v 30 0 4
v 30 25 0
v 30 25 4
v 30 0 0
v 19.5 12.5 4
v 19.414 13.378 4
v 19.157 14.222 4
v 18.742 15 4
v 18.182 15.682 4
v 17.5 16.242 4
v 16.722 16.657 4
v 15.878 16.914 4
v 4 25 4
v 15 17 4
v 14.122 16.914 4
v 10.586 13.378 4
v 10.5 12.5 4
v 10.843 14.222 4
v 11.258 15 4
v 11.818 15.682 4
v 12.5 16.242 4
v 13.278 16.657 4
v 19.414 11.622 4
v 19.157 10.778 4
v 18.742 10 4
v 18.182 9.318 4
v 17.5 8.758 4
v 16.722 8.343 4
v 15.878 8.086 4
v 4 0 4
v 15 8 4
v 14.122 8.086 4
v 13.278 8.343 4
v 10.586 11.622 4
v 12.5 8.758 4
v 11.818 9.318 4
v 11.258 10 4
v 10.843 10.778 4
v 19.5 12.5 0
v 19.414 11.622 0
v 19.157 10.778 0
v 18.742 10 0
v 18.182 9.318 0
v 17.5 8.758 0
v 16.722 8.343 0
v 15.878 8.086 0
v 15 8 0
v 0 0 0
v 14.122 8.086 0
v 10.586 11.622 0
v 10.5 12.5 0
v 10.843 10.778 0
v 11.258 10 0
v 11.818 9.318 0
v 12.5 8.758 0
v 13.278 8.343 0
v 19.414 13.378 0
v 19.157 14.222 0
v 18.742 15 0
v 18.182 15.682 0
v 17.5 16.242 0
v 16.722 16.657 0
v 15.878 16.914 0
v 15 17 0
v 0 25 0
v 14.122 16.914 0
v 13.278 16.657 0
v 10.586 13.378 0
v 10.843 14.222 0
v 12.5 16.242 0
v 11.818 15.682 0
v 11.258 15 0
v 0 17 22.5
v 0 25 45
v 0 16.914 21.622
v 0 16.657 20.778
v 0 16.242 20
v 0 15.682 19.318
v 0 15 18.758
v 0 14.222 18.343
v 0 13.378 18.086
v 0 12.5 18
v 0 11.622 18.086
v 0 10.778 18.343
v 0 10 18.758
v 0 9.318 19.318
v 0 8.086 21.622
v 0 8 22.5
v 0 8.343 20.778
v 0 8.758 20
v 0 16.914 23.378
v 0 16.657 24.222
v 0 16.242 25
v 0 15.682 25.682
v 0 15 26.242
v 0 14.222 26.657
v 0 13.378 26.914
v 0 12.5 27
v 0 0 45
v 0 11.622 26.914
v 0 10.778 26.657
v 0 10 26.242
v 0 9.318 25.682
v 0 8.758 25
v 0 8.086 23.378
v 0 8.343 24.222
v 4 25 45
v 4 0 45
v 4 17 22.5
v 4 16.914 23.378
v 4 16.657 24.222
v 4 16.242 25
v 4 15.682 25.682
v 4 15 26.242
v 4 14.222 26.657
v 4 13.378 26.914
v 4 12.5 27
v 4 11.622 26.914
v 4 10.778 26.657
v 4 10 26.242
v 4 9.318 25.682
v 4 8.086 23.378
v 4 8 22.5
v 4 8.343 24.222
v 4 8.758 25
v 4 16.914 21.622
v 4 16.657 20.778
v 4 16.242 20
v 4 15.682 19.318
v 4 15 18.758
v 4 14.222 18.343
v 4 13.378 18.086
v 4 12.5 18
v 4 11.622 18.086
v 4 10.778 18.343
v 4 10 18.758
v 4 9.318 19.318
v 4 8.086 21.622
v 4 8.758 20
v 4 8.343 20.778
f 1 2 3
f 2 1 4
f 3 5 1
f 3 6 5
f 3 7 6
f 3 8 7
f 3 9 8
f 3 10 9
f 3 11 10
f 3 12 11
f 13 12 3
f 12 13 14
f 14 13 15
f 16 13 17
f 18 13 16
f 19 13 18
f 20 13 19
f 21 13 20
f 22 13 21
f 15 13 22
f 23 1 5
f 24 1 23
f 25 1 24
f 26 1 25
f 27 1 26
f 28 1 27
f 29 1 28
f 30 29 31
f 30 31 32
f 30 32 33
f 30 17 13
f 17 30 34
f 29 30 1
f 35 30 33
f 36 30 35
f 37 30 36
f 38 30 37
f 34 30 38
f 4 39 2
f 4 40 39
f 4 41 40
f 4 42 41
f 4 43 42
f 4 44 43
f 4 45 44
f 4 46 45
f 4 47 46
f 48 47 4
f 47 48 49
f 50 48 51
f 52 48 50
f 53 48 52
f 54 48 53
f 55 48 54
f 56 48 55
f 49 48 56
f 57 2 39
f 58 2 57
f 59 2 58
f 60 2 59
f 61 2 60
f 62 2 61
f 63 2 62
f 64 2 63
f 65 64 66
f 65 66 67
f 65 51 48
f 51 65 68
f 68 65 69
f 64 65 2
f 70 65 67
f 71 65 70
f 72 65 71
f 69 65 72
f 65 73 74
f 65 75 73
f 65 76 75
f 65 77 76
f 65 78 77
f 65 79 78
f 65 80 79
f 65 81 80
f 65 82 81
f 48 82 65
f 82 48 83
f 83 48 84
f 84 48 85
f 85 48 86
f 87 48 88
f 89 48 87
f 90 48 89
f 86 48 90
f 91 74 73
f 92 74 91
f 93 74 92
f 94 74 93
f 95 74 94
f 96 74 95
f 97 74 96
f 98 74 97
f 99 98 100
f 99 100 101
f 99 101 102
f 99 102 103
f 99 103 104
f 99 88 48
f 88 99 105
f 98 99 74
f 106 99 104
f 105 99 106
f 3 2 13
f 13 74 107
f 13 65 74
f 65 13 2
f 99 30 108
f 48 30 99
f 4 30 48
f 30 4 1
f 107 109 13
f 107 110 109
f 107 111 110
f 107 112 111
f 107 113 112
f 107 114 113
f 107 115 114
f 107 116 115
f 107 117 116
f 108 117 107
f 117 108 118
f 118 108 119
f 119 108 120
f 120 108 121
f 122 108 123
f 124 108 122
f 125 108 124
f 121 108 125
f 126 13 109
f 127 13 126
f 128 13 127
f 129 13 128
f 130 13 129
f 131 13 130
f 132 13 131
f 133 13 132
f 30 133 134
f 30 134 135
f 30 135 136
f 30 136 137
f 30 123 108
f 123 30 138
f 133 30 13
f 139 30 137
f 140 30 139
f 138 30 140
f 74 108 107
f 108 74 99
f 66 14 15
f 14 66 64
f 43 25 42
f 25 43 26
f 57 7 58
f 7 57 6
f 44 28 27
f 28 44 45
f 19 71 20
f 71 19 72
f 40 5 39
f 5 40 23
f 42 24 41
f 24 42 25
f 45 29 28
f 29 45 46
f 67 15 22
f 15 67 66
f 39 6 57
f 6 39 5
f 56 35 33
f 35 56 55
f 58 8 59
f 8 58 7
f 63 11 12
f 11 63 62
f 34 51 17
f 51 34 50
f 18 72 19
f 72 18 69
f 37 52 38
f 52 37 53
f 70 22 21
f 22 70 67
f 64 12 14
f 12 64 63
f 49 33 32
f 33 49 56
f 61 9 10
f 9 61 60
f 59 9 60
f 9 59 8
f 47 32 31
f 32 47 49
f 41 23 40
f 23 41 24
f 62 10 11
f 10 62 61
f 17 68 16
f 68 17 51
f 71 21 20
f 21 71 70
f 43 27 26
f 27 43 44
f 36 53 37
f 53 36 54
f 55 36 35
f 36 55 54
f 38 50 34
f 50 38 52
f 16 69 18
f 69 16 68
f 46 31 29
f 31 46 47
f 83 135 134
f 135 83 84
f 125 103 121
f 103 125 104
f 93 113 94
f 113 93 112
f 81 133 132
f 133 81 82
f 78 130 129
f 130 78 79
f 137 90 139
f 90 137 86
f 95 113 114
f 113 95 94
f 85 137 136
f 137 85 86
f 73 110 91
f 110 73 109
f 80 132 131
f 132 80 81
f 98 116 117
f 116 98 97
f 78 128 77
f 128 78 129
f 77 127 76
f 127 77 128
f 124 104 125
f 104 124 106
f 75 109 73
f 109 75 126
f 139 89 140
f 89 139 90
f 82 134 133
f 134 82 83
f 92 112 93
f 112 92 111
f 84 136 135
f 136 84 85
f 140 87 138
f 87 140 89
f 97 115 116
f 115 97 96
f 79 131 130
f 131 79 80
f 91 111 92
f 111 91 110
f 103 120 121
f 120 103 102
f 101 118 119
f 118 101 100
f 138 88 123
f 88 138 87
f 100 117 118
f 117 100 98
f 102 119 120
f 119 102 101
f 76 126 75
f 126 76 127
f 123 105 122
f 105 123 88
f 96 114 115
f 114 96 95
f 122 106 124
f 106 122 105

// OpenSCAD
$fn = 32;
// ----------------------------------------------------------------------
// L-bracket: 30 x 25 x 45 mm
// ----------------------------------------------------------------------

// --- parameters (mm) ---
base_len = 30;            // horizontal leg, X
upright_h = 45;           // vertical leg, Z
flange_w = 25;            // bracket depth, Y
mat_t = 4;                // plate thickness
hole_d = 9;               // clearance for M8

module hole_z(px, py) {
  translate([px, py, -2.5]) cylinder(h = mat_t + 5, d = hole_d);
}
module hole_x(pz, py) {
  translate([-2.5, py, pz]) rotate([0, 90, 0]) cylinder(h = mat_t + 5, d = hole_d);
}

difference() {
  union() {
    /* horizontal leg */
    cube([base_len, flange_w, mat_t]);
    /* vertical leg, overlapping the corner block */
    cube([mat_t, flange_w, upright_h]);
  }
  hole_z(15, 12.5);
  hole_x(22.5, 12.5);
}
